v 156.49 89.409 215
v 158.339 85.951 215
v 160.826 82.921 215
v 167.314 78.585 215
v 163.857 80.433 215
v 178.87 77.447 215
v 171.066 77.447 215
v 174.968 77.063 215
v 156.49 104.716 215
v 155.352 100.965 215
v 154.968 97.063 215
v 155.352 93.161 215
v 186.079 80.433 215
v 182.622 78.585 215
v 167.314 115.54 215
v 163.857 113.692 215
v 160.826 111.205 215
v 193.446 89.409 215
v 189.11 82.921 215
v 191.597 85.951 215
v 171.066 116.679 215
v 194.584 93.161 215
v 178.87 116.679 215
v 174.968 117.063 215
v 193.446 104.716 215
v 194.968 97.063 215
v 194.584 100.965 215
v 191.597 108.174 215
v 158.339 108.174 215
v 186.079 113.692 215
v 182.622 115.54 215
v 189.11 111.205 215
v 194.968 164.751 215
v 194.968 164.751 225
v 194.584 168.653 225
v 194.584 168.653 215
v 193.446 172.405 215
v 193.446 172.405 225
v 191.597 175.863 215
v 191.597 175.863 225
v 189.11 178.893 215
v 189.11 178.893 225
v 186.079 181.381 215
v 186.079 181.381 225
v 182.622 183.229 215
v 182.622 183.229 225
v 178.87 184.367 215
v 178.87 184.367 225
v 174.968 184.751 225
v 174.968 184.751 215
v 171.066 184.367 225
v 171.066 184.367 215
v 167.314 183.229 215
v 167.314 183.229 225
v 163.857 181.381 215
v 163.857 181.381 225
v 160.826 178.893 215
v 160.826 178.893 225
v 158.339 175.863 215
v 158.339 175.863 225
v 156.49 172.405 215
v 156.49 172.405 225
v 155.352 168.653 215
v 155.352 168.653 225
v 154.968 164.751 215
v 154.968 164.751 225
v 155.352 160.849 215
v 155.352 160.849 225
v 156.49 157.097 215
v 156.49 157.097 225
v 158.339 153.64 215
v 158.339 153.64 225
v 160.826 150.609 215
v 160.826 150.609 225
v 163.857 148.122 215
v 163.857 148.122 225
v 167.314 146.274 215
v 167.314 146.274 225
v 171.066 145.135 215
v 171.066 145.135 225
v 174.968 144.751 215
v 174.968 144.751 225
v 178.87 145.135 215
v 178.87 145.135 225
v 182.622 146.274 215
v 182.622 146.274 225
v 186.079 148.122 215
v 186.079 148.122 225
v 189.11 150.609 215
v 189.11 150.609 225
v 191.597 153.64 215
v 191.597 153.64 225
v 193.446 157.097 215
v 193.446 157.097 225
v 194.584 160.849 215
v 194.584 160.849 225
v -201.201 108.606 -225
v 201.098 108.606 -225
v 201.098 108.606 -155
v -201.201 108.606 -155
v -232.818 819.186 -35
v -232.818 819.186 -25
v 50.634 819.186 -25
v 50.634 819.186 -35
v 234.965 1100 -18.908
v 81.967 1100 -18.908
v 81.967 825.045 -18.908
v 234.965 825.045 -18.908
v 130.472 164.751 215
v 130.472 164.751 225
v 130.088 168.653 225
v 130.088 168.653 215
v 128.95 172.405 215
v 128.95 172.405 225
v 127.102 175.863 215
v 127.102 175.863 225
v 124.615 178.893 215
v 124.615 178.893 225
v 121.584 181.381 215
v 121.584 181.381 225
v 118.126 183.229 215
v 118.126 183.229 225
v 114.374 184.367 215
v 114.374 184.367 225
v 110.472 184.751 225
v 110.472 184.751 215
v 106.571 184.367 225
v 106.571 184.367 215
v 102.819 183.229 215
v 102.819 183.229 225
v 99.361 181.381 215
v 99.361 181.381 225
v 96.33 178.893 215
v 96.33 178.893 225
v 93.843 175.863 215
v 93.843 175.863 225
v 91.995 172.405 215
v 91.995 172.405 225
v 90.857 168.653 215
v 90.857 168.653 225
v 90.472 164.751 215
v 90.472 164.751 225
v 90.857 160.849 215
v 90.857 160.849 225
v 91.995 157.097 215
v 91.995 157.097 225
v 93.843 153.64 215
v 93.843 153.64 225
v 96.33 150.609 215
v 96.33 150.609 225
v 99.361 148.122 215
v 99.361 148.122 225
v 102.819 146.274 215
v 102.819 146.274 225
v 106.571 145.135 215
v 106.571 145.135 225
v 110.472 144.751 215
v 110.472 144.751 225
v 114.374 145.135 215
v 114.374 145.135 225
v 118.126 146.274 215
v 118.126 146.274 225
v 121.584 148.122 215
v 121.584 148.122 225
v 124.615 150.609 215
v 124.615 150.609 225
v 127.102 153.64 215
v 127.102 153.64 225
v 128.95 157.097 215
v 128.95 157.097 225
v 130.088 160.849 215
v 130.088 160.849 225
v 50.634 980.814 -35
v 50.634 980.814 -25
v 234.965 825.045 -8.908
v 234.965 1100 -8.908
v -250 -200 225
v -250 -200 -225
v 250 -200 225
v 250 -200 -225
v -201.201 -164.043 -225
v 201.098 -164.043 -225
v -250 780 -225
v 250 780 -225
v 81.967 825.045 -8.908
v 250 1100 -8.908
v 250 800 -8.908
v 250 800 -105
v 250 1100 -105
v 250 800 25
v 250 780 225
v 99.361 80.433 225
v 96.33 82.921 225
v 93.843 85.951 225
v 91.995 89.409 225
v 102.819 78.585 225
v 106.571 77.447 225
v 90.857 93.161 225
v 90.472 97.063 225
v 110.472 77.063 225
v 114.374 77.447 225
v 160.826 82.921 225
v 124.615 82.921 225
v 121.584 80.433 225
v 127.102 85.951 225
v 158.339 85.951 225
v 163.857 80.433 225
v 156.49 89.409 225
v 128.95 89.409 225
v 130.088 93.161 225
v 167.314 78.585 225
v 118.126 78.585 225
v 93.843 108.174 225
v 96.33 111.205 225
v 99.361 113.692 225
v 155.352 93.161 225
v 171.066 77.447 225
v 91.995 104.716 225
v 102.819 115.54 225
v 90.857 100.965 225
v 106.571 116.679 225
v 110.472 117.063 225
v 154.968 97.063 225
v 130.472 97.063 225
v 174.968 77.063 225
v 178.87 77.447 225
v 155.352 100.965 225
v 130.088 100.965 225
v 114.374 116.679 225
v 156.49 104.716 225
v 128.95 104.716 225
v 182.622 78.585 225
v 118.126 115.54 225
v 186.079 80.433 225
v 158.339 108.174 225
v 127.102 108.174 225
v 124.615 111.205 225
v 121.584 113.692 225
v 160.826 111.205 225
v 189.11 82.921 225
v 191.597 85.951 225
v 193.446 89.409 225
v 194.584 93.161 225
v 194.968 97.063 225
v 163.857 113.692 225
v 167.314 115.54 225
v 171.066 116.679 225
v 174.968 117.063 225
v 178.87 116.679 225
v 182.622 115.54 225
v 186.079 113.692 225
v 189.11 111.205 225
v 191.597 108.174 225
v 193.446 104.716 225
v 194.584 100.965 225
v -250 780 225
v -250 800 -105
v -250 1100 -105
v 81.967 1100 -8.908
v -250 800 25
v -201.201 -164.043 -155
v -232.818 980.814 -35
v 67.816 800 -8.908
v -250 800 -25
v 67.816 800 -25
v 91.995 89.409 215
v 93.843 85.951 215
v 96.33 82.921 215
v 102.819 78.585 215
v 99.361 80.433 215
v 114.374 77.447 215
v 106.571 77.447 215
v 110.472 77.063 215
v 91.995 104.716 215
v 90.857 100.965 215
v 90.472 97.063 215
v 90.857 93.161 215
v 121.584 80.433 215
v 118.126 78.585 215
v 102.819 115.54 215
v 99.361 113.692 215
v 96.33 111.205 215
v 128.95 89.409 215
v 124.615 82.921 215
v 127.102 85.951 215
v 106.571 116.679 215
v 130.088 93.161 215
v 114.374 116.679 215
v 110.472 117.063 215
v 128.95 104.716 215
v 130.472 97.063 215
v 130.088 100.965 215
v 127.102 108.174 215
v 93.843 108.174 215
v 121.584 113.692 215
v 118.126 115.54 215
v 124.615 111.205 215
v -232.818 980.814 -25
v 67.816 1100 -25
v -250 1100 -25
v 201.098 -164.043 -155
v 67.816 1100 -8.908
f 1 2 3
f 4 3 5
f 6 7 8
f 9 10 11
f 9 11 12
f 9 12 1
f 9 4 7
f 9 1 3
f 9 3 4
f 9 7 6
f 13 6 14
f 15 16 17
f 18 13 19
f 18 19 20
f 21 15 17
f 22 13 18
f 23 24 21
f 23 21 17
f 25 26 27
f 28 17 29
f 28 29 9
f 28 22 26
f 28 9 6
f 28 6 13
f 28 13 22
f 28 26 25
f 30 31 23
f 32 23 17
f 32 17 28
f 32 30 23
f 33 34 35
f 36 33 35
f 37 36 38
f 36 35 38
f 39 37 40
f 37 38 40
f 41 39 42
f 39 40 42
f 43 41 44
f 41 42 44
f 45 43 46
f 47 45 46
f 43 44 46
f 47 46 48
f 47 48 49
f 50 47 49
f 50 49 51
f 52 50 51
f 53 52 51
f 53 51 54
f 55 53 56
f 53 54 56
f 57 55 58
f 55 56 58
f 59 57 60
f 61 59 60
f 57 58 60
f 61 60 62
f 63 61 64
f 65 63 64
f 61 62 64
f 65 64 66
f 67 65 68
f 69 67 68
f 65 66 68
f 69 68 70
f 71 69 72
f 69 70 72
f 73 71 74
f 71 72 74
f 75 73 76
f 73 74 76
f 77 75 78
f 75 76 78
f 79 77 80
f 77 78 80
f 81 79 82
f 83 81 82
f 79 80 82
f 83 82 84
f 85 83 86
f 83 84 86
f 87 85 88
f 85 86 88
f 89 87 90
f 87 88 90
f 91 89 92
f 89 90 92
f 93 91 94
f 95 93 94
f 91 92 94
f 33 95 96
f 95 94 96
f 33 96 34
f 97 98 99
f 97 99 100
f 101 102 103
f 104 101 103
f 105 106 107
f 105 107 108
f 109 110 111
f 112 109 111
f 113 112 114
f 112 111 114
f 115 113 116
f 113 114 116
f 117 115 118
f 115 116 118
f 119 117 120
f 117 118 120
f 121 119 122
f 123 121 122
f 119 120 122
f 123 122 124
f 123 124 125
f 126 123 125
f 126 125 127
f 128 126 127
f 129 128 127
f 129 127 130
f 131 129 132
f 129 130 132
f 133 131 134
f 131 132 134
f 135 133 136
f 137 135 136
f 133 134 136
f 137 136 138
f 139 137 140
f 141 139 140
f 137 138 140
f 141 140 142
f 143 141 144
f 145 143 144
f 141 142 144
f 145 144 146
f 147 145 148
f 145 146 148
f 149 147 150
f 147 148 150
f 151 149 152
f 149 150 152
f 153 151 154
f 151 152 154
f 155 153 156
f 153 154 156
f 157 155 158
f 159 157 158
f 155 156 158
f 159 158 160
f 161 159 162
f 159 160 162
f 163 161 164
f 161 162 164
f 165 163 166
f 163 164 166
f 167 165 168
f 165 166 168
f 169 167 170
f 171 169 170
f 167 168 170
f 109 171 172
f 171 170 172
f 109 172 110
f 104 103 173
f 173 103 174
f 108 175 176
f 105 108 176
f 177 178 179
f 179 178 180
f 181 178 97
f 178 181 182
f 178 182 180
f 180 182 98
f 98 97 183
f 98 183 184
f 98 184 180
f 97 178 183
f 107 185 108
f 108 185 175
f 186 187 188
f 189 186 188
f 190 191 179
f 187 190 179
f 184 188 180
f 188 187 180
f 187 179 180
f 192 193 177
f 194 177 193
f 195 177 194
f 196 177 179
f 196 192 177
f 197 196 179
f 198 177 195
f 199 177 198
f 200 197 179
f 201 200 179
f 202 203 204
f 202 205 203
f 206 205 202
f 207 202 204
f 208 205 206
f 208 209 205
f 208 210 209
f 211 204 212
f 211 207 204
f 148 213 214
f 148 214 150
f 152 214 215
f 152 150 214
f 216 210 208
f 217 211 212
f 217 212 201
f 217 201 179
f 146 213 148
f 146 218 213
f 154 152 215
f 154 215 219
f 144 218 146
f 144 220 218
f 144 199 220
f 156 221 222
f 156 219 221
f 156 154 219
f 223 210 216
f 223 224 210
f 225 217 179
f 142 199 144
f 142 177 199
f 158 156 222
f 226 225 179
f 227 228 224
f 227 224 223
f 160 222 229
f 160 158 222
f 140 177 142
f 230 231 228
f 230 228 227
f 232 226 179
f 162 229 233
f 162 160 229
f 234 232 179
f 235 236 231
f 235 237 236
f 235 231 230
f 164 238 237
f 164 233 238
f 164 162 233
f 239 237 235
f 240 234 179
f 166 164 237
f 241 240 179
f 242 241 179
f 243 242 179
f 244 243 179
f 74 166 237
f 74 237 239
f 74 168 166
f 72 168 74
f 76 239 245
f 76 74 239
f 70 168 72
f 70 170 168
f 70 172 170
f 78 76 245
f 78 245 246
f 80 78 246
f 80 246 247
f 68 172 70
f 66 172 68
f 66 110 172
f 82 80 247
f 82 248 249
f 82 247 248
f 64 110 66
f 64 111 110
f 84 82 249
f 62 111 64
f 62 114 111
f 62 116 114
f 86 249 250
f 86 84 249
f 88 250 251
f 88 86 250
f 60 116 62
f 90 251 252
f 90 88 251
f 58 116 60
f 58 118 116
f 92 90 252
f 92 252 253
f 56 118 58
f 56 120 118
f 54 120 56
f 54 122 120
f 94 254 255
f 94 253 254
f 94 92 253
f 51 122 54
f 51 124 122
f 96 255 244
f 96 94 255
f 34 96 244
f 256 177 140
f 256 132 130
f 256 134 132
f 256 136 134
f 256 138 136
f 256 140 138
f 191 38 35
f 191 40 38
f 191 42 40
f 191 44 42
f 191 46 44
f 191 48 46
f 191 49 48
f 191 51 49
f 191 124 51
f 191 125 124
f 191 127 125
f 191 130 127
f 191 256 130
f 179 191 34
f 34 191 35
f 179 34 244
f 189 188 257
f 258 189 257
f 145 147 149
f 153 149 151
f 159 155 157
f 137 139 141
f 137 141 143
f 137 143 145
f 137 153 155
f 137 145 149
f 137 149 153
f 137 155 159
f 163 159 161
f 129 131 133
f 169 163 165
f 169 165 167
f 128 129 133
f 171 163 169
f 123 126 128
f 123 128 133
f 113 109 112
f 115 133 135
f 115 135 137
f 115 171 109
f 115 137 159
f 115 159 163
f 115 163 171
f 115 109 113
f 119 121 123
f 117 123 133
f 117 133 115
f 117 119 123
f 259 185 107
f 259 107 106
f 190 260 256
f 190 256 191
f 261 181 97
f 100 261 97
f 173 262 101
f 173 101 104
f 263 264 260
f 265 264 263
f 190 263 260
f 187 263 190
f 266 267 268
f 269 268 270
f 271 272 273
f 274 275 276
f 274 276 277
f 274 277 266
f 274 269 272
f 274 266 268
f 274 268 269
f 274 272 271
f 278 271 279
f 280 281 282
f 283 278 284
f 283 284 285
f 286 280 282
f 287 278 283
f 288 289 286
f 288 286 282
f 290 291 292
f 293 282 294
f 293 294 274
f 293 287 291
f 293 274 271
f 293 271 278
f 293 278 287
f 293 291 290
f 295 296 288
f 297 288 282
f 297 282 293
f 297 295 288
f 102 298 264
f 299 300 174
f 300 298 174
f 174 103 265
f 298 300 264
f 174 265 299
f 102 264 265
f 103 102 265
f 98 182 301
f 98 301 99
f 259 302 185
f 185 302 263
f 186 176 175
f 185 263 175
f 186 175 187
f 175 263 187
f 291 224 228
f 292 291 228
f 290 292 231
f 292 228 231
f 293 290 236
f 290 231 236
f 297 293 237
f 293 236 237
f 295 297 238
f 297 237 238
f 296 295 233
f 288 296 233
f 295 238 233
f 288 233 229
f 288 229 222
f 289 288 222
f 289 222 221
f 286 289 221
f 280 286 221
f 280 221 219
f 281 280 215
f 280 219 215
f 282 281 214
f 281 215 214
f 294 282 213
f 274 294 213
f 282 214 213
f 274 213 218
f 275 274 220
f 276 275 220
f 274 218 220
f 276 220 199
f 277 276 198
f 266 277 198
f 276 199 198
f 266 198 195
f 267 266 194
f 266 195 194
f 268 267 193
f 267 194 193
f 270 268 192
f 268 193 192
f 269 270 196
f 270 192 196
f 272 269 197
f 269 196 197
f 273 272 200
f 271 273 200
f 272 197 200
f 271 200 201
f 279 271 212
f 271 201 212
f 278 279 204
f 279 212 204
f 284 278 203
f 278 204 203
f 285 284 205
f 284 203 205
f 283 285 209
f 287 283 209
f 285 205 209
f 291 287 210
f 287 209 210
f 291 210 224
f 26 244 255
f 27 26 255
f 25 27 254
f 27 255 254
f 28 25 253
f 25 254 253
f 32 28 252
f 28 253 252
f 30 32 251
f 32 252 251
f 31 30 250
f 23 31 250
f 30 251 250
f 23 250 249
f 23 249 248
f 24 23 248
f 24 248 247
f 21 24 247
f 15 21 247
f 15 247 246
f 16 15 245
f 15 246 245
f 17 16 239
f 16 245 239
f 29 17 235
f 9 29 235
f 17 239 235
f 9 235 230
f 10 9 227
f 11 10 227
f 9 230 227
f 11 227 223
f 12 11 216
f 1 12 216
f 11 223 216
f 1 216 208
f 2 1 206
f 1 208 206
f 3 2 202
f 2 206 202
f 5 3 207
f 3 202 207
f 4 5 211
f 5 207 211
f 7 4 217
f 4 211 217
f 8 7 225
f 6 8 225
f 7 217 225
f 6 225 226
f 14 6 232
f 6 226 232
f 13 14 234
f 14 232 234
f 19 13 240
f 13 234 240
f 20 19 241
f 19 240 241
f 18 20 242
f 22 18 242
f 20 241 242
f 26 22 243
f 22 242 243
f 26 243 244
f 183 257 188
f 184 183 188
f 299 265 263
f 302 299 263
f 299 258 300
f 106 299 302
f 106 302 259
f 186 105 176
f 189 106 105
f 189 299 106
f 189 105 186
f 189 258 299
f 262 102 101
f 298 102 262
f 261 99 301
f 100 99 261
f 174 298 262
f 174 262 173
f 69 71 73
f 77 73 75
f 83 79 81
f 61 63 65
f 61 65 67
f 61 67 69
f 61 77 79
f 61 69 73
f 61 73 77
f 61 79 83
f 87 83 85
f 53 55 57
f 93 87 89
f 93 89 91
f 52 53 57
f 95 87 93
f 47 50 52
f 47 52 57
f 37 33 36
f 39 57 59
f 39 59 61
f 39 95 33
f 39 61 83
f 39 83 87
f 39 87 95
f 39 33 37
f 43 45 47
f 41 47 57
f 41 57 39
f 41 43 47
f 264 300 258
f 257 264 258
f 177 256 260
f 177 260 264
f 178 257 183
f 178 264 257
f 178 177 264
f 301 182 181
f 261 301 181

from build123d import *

# Parameters (mm, degrees)
SKETCH2_W                = 500
SKETCH2_H                = 450
BOSS_EXTRUDE1_DEPTH      = 800
BOSS_EXTRUDE1_DEPTH_BACK = 200
CHAMFER1_SIZE            = 20
CHAMFER1_SIZE2           = 200
CHAMFER2_SIZE            = 20
CHAMFER2_SIZE2           = 120
SKETCH9_W                = 317.816050667
SKETCH9_H                = 80.00001522
BOSS_EXTRUDE2_DEPTH      = 300
SKETCH10_W               = 283.451852853
SKETCH10_H               = 161.628693338
CUT_EXTRUDE1_DEPTH       = 10
SKETCH11_R               = 20
CUT_EXTRUDE2_DEPTH       = 10
SKETCH12_W               = 152.997678588
SKETCH12_H               = 274.954886326
CUT_EXTRUDE3_DEPTH       = 10
SKETCH13_W               = 152.997678588
SKETCH13_H               = 17.889097052
BOSS_EXTRUDE3_DEPTH      = 175
SKETCH15_W               = 402.299842062
SKETCH15_H               = 272.648708127
CUT_EXTRUDE4_DEPTH       = 70


with BuildPart() as part:
    # Sketch2 → Boss-Extrude1 (new body, two sides)
    with BuildSketch(Plane(origin=(0, 0, 0), x_dir=(1, 0, 0), z_dir=(0, 1, 0))) as boss_extrude1_sk:
        Rectangle(SKETCH2_W, SKETCH2_H)
    extrude(amount=BOSS_EXTRUDE1_DEPTH)
    extrude(boss_extrude1_sk.sketch, amount=-BOSS_EXTRUDE1_DEPTH_BACK)

    # Chamfer1
    chamfer1_edges = [part.edges().sort_by_distance(p)[0] for p in [
        (0, 800, 225),
    ]]
    chamfer1_side = [part.faces().sort_by_distance(p)[0] for p in [
        (0, 300, 225),
    ]]
    chamfer(chamfer1_edges, length=CHAMFER1_SIZE, length2=CHAMFER1_SIZE2, reference=chamfer1_side[0])

    # Chamfer2
    chamfer2_edges = [part.edges().sort_by_distance(p)[0] for p in [
        (0, 800, -225),
    ]]
    chamfer2_side = [part.faces().sort_by_distance(p)[0] for p in [
        (0, 300, -225),
    ]]
    chamfer(chamfer2_edges, length=CHAMFER2_SIZE, length2=CHAMFER2_SIZE2, reference=chamfer2_side[0])

    # Sketch9 → Boss-Extrude2 (add)
    with BuildSketch(Plane(origin=(0, 800, 0), x_dir=(1, 0, 0), z_dir=(0, 1, 0))):
        with Locations((-91.091974667, 64.99999239)):
            Rectangle(SKETCH9_W, SKETCH9_H)
        Polygon((250, 105), (67.816050667, 105), (67.816050667, 24.99998478), (67.816050667, 8.908040554), (250, 8.908040554), align=None)
    extrude(amount=BOSS_EXTRUDE2_DEPTH)

    # Sketch10 → Cut-Extrude1 (cut)
    with BuildSketch(Plane.XY.offset(-24.99998478)):
        with Locations((-91.091974667, 900)):
            Rectangle(SKETCH10_W, SKETCH10_H)
    extrude(amount=-CUT_EXTRUDE1_DEPTH, mode=Mode.SUBTRACT)

    # Sketch11 → Cut-Extrude2 (cut)
    with BuildSketch(Plane.XY.offset(225)):
        with Locations((110.472474251, 164.751161956)):
            Circle(SKETCH11_R)
        with Locations((174.967964998, 164.751161956)):
            Circle(SKETCH11_R)
        with Locations((110.472474251, 97.062825132)):
            Circle(SKETCH11_R)
        with Locations((174.967964998, 97.062825132)):
            Circle(SKETCH11_R)
    extrude(amount=-CUT_EXTRUDE2_DEPTH, mode=Mode.SUBTRACT)

    # Sketch12 → Cut-Extrude3 (cut)
    with BuildSketch(Plane.XY.offset(-8.908040554)):
        with Locations((158.466067066, 962.522556837)):
            Rectangle(SKETCH12_W, SKETCH12_H)
    extrude(amount=-CUT_EXTRUDE3_DEPTH, mode=Mode.SUBTRACT)

    # Sketch13 → Boss-Extrude3 (add)
    with BuildSketch(Plane(origin=(0, 825.045113674, 0), x_dir=(1, 0, 0), z_dir=(0, 1, 0))):
        with Locations((158.466067066, 96.055451474)):
            Rectangle(SKETCH13_W, SKETCH13_H)
    extrude(amount=BOSS_EXTRUDE3_DEPTH)

    # Sketch15 → Cut-Extrude4 (cut)
    with BuildSketch(Plane(origin=(0, 0, -225), x_dir=(-1, 0, 0), z_dir=(0, 0, -1))):
        with Locations((0.051547356, -27.71868848)):
            Rectangle(SKETCH15_W, SKETCH15_H)
    extrude(amount=-CUT_EXTRUDE4_DEPTH, mode=Mode.SUBTRACT)


solid = part.part
